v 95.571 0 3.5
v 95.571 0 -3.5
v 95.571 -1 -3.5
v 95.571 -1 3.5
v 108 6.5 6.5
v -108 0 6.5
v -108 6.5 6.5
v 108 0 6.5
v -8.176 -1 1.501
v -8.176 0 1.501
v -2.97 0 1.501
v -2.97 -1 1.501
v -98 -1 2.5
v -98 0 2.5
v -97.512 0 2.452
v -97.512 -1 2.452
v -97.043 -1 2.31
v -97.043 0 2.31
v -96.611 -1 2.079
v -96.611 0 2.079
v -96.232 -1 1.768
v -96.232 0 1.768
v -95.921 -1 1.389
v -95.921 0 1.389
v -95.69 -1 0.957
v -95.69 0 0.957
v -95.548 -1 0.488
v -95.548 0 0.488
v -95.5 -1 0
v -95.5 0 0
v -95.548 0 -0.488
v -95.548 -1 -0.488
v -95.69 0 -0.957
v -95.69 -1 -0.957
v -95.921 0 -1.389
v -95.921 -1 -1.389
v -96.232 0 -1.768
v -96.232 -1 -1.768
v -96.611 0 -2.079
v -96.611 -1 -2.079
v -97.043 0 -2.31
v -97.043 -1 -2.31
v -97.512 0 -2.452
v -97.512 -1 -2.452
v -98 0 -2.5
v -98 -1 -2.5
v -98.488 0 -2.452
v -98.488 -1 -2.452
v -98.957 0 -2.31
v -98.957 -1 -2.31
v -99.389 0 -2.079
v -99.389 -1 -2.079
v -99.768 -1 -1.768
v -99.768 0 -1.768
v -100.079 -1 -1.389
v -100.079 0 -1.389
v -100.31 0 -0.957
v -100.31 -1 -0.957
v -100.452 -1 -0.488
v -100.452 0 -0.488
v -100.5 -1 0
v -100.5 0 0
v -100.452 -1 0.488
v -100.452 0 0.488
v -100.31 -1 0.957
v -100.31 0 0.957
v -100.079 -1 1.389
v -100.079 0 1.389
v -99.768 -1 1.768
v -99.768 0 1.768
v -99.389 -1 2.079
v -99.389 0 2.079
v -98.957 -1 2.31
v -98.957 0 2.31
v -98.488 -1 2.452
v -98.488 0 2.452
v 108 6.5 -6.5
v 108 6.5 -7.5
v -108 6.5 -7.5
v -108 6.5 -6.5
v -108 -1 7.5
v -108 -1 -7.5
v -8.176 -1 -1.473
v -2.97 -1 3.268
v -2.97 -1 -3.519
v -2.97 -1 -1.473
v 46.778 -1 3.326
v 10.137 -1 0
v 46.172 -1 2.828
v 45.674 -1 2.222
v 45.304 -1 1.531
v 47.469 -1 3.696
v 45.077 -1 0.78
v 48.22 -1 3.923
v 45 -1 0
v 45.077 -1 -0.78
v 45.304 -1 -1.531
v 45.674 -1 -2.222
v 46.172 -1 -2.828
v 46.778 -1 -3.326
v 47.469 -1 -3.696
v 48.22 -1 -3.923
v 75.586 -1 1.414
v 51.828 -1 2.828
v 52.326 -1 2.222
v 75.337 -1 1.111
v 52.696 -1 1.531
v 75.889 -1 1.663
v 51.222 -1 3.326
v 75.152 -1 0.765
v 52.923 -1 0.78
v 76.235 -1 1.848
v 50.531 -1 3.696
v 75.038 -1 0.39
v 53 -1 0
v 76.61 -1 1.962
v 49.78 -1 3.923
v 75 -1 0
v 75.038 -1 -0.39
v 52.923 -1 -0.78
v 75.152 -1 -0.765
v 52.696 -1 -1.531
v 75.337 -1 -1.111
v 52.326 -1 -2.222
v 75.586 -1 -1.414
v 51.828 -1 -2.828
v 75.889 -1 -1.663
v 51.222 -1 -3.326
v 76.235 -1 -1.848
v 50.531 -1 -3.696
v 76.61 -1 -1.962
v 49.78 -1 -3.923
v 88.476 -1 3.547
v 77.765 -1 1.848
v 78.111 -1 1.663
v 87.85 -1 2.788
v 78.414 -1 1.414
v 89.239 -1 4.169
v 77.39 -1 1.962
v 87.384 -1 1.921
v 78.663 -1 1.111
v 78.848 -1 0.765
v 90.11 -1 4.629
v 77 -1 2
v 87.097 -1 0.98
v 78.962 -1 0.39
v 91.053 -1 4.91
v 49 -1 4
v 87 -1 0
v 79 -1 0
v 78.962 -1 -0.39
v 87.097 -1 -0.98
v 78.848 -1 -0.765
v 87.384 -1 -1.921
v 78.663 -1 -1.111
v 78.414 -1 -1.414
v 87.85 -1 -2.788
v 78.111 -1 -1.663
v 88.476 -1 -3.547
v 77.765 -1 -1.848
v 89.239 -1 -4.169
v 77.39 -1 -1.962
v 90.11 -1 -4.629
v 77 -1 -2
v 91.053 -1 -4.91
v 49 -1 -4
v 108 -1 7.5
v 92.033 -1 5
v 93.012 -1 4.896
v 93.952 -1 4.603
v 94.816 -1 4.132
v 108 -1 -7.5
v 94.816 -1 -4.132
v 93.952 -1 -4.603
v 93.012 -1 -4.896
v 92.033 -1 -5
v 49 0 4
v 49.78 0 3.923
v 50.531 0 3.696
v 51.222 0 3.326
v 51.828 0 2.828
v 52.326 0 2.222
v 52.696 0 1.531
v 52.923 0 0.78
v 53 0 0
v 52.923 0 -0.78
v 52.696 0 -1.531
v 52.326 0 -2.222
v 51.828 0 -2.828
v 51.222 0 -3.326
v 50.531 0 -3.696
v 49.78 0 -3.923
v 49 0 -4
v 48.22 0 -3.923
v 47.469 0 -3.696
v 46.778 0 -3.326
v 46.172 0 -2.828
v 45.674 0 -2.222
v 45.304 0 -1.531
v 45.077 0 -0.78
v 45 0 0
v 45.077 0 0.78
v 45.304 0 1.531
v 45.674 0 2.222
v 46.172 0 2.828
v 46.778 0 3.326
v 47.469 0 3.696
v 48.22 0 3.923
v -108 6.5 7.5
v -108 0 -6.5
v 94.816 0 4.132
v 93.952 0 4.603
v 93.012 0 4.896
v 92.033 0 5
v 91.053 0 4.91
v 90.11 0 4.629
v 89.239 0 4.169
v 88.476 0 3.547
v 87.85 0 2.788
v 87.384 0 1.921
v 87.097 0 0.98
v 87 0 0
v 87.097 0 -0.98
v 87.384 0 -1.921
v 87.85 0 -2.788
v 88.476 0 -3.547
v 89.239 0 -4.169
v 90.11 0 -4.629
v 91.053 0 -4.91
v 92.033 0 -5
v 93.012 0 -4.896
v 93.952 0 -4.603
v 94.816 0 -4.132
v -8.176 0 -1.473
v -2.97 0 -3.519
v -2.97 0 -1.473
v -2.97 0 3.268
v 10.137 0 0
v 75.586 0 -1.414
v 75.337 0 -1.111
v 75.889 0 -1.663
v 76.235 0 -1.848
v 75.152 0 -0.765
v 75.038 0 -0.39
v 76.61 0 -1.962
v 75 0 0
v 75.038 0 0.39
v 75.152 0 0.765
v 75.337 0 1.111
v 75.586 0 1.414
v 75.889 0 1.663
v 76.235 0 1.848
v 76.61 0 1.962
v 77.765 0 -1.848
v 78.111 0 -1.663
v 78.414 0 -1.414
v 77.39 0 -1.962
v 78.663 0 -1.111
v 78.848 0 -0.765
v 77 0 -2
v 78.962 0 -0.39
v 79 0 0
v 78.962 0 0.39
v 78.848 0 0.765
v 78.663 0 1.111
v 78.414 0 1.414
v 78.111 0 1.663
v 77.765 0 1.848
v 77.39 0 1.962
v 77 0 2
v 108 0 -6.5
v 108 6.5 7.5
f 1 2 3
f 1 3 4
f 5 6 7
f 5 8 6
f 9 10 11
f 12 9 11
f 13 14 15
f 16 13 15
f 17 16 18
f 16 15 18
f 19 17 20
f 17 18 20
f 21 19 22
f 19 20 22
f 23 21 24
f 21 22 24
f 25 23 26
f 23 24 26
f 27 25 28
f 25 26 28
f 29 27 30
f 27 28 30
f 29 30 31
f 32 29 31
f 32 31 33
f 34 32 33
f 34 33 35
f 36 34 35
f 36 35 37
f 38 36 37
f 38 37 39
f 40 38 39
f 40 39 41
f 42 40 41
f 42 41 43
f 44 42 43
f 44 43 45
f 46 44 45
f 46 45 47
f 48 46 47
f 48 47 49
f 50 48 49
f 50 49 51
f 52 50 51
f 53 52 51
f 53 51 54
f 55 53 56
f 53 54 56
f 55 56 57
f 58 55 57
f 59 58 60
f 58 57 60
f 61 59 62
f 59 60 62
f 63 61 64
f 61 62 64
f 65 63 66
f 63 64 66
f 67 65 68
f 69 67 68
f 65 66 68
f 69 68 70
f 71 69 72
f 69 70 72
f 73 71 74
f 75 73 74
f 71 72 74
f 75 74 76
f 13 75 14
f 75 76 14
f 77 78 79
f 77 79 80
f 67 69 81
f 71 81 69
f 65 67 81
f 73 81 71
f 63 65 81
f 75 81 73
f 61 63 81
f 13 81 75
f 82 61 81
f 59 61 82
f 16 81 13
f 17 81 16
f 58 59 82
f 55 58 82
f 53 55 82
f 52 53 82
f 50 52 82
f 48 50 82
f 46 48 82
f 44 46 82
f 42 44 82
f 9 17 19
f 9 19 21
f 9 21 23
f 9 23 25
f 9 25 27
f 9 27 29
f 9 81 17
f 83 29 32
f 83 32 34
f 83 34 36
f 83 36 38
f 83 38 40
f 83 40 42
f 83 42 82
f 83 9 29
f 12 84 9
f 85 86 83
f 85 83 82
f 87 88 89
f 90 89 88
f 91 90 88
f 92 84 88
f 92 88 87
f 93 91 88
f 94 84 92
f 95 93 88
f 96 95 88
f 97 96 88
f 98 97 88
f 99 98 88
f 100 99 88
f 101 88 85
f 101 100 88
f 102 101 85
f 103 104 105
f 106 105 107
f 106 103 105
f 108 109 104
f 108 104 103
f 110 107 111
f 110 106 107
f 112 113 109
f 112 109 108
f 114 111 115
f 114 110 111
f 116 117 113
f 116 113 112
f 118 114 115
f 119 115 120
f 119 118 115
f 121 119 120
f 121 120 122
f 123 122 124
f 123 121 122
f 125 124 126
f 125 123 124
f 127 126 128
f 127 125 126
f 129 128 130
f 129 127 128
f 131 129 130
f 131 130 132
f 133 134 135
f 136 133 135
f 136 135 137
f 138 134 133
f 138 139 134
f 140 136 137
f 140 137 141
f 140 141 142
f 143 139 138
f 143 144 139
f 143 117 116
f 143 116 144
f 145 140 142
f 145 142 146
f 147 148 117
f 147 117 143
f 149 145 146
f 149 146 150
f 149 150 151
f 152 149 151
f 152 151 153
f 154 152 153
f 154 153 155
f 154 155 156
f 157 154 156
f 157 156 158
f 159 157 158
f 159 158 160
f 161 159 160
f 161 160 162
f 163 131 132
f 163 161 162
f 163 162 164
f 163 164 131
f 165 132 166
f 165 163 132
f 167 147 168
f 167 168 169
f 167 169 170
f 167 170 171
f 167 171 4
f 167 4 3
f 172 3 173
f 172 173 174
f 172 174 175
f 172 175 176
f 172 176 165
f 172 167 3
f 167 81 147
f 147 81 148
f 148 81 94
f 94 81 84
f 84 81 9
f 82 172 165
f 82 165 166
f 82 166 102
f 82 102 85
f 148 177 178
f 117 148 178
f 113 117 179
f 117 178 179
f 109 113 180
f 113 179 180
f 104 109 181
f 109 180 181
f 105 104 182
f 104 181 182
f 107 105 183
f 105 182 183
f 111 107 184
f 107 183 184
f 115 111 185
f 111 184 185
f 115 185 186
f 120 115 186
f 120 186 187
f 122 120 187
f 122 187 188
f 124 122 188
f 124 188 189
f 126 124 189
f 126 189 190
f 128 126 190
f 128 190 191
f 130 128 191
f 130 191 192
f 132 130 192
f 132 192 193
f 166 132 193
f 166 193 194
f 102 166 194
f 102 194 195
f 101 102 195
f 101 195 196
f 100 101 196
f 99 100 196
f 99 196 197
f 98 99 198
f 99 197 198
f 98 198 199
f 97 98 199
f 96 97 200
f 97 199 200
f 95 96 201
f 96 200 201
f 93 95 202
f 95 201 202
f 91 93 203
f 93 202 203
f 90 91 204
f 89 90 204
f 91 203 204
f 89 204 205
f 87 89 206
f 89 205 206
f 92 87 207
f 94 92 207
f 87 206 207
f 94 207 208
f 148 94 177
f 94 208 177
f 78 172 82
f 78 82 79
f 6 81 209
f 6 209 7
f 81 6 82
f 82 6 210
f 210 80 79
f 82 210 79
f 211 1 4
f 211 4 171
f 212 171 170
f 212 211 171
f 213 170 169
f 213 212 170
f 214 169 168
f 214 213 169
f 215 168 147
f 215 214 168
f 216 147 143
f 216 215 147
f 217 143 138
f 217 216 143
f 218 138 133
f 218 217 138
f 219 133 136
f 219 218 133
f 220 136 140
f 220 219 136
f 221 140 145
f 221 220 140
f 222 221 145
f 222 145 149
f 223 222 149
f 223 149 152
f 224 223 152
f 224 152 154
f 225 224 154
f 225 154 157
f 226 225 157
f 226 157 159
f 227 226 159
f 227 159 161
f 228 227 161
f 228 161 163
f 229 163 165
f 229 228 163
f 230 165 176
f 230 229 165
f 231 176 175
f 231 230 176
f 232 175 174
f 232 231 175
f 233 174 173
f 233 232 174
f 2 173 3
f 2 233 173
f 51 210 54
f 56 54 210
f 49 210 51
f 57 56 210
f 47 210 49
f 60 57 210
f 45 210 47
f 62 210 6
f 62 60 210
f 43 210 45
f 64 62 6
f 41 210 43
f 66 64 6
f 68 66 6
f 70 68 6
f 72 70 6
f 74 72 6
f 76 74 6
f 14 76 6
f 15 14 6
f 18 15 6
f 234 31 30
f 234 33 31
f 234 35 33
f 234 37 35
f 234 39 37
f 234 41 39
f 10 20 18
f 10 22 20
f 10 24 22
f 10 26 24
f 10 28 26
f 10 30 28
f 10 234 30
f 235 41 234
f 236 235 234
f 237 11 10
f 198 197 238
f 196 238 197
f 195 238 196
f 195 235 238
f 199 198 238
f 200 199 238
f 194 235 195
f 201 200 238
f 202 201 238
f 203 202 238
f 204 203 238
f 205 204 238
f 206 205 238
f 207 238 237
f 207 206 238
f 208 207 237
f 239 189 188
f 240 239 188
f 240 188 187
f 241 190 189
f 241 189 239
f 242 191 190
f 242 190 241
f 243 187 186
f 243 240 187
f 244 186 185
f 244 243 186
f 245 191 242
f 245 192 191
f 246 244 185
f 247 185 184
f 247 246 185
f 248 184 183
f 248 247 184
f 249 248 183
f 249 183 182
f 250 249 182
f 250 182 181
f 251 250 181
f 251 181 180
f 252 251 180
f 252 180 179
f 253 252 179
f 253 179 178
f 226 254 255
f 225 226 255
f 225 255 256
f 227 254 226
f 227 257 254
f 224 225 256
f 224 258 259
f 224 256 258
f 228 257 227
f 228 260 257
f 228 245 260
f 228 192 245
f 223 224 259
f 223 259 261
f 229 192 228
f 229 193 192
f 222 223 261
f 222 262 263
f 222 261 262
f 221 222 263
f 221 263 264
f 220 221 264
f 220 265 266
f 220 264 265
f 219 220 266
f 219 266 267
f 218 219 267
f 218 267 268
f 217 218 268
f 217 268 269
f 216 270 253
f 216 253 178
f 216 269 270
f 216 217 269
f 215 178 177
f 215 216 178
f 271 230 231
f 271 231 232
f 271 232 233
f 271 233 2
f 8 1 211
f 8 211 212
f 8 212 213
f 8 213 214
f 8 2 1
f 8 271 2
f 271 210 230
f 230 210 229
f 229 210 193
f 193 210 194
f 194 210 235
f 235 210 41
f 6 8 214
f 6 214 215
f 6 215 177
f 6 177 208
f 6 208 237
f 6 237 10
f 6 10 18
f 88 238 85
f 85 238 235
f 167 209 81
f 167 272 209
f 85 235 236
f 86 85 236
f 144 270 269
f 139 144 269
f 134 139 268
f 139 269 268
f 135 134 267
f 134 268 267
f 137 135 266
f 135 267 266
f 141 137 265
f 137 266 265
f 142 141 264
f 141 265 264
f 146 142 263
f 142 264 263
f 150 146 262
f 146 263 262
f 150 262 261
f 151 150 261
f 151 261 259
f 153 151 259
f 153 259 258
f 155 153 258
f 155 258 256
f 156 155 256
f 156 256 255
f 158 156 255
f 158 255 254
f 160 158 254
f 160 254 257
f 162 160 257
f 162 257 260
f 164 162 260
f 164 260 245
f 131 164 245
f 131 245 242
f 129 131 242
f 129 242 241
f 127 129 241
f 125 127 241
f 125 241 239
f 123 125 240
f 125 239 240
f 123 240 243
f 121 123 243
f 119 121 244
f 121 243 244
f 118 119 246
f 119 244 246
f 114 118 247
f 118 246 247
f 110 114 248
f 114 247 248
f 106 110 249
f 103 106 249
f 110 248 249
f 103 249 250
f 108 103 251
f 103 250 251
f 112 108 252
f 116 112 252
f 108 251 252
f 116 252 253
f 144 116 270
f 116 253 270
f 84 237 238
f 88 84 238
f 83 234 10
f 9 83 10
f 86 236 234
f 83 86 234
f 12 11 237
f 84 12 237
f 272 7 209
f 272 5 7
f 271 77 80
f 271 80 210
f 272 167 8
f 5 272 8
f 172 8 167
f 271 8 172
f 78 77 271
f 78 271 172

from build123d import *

# Parameters (mm, degrees)
BOSS_EXTRU_1_DEPTH      = 108
ESQUISSE2_R             = 2.5
ESQUISSE2_R_2           = 4
ESQUISSE2_R_3           = 2
ENL_V_MAT_EXTRU_1_DEPTH = 109.455059817


with BuildPart() as part:
    # Esquisse1 → Boss.-Extru.1 (new, symmetric)
    with BuildSketch(Plane(origin=(0, 0, 0), x_dir=(0, 0, -1), z_dir=(1, 0, 0))):
        Polygon((-7.5, 6.5), (-7.5, -1), (7.5, -1), (7.5, 6.5), (6.5, 6.5), (6.5, 0), (-6.5, 0), (-6.5, 6.5), align=None)
    extrude(amount=BOSS_EXTRU_1_DEPTH, both=True)

    # Esquisse2 → Enlèv. mat.-Extru.1 (cut, through all)
    with BuildSketch(Plane(origin=(0, 0, 0), x_dir=(1, 0, 0), z_dir=(0, 1, 0))):
        with Locations(Location((-98, 0, 0), (0, 0, 270))):
            Circle(ESQUISSE2_R)
        with Locations(Location((49, 0, 0), (0, 0, 270))):
            Circle(ESQUISSE2_R_2)
        with Locations(Location((77, 0, 0), (0, 0, 270))):
            Circle(ESQUISSE2_R_3)
        with BuildLine():
            Line((95.570714214, 3.5), (95.570714214, -3.5))
            ThreePointArc((95.570714214, -3.5), (87, 0), (95.570714214, 3.5))
        make_face()
        Polygon((-8.175932032, 1.473487567), (-8.175932032, -1.501256313), (-2.970130241, -1.501256313), (-2.970130241, -3.267510492), (10.137334983, 0), (-2.970130241, 3.518623985), (-2.970130241, 1.473487567), align=None)
    extrude(amount=-ENL_V_MAT_EXTRU_1_DEPTH, mode=Mode.SUBTRACT)


solid = part.part
